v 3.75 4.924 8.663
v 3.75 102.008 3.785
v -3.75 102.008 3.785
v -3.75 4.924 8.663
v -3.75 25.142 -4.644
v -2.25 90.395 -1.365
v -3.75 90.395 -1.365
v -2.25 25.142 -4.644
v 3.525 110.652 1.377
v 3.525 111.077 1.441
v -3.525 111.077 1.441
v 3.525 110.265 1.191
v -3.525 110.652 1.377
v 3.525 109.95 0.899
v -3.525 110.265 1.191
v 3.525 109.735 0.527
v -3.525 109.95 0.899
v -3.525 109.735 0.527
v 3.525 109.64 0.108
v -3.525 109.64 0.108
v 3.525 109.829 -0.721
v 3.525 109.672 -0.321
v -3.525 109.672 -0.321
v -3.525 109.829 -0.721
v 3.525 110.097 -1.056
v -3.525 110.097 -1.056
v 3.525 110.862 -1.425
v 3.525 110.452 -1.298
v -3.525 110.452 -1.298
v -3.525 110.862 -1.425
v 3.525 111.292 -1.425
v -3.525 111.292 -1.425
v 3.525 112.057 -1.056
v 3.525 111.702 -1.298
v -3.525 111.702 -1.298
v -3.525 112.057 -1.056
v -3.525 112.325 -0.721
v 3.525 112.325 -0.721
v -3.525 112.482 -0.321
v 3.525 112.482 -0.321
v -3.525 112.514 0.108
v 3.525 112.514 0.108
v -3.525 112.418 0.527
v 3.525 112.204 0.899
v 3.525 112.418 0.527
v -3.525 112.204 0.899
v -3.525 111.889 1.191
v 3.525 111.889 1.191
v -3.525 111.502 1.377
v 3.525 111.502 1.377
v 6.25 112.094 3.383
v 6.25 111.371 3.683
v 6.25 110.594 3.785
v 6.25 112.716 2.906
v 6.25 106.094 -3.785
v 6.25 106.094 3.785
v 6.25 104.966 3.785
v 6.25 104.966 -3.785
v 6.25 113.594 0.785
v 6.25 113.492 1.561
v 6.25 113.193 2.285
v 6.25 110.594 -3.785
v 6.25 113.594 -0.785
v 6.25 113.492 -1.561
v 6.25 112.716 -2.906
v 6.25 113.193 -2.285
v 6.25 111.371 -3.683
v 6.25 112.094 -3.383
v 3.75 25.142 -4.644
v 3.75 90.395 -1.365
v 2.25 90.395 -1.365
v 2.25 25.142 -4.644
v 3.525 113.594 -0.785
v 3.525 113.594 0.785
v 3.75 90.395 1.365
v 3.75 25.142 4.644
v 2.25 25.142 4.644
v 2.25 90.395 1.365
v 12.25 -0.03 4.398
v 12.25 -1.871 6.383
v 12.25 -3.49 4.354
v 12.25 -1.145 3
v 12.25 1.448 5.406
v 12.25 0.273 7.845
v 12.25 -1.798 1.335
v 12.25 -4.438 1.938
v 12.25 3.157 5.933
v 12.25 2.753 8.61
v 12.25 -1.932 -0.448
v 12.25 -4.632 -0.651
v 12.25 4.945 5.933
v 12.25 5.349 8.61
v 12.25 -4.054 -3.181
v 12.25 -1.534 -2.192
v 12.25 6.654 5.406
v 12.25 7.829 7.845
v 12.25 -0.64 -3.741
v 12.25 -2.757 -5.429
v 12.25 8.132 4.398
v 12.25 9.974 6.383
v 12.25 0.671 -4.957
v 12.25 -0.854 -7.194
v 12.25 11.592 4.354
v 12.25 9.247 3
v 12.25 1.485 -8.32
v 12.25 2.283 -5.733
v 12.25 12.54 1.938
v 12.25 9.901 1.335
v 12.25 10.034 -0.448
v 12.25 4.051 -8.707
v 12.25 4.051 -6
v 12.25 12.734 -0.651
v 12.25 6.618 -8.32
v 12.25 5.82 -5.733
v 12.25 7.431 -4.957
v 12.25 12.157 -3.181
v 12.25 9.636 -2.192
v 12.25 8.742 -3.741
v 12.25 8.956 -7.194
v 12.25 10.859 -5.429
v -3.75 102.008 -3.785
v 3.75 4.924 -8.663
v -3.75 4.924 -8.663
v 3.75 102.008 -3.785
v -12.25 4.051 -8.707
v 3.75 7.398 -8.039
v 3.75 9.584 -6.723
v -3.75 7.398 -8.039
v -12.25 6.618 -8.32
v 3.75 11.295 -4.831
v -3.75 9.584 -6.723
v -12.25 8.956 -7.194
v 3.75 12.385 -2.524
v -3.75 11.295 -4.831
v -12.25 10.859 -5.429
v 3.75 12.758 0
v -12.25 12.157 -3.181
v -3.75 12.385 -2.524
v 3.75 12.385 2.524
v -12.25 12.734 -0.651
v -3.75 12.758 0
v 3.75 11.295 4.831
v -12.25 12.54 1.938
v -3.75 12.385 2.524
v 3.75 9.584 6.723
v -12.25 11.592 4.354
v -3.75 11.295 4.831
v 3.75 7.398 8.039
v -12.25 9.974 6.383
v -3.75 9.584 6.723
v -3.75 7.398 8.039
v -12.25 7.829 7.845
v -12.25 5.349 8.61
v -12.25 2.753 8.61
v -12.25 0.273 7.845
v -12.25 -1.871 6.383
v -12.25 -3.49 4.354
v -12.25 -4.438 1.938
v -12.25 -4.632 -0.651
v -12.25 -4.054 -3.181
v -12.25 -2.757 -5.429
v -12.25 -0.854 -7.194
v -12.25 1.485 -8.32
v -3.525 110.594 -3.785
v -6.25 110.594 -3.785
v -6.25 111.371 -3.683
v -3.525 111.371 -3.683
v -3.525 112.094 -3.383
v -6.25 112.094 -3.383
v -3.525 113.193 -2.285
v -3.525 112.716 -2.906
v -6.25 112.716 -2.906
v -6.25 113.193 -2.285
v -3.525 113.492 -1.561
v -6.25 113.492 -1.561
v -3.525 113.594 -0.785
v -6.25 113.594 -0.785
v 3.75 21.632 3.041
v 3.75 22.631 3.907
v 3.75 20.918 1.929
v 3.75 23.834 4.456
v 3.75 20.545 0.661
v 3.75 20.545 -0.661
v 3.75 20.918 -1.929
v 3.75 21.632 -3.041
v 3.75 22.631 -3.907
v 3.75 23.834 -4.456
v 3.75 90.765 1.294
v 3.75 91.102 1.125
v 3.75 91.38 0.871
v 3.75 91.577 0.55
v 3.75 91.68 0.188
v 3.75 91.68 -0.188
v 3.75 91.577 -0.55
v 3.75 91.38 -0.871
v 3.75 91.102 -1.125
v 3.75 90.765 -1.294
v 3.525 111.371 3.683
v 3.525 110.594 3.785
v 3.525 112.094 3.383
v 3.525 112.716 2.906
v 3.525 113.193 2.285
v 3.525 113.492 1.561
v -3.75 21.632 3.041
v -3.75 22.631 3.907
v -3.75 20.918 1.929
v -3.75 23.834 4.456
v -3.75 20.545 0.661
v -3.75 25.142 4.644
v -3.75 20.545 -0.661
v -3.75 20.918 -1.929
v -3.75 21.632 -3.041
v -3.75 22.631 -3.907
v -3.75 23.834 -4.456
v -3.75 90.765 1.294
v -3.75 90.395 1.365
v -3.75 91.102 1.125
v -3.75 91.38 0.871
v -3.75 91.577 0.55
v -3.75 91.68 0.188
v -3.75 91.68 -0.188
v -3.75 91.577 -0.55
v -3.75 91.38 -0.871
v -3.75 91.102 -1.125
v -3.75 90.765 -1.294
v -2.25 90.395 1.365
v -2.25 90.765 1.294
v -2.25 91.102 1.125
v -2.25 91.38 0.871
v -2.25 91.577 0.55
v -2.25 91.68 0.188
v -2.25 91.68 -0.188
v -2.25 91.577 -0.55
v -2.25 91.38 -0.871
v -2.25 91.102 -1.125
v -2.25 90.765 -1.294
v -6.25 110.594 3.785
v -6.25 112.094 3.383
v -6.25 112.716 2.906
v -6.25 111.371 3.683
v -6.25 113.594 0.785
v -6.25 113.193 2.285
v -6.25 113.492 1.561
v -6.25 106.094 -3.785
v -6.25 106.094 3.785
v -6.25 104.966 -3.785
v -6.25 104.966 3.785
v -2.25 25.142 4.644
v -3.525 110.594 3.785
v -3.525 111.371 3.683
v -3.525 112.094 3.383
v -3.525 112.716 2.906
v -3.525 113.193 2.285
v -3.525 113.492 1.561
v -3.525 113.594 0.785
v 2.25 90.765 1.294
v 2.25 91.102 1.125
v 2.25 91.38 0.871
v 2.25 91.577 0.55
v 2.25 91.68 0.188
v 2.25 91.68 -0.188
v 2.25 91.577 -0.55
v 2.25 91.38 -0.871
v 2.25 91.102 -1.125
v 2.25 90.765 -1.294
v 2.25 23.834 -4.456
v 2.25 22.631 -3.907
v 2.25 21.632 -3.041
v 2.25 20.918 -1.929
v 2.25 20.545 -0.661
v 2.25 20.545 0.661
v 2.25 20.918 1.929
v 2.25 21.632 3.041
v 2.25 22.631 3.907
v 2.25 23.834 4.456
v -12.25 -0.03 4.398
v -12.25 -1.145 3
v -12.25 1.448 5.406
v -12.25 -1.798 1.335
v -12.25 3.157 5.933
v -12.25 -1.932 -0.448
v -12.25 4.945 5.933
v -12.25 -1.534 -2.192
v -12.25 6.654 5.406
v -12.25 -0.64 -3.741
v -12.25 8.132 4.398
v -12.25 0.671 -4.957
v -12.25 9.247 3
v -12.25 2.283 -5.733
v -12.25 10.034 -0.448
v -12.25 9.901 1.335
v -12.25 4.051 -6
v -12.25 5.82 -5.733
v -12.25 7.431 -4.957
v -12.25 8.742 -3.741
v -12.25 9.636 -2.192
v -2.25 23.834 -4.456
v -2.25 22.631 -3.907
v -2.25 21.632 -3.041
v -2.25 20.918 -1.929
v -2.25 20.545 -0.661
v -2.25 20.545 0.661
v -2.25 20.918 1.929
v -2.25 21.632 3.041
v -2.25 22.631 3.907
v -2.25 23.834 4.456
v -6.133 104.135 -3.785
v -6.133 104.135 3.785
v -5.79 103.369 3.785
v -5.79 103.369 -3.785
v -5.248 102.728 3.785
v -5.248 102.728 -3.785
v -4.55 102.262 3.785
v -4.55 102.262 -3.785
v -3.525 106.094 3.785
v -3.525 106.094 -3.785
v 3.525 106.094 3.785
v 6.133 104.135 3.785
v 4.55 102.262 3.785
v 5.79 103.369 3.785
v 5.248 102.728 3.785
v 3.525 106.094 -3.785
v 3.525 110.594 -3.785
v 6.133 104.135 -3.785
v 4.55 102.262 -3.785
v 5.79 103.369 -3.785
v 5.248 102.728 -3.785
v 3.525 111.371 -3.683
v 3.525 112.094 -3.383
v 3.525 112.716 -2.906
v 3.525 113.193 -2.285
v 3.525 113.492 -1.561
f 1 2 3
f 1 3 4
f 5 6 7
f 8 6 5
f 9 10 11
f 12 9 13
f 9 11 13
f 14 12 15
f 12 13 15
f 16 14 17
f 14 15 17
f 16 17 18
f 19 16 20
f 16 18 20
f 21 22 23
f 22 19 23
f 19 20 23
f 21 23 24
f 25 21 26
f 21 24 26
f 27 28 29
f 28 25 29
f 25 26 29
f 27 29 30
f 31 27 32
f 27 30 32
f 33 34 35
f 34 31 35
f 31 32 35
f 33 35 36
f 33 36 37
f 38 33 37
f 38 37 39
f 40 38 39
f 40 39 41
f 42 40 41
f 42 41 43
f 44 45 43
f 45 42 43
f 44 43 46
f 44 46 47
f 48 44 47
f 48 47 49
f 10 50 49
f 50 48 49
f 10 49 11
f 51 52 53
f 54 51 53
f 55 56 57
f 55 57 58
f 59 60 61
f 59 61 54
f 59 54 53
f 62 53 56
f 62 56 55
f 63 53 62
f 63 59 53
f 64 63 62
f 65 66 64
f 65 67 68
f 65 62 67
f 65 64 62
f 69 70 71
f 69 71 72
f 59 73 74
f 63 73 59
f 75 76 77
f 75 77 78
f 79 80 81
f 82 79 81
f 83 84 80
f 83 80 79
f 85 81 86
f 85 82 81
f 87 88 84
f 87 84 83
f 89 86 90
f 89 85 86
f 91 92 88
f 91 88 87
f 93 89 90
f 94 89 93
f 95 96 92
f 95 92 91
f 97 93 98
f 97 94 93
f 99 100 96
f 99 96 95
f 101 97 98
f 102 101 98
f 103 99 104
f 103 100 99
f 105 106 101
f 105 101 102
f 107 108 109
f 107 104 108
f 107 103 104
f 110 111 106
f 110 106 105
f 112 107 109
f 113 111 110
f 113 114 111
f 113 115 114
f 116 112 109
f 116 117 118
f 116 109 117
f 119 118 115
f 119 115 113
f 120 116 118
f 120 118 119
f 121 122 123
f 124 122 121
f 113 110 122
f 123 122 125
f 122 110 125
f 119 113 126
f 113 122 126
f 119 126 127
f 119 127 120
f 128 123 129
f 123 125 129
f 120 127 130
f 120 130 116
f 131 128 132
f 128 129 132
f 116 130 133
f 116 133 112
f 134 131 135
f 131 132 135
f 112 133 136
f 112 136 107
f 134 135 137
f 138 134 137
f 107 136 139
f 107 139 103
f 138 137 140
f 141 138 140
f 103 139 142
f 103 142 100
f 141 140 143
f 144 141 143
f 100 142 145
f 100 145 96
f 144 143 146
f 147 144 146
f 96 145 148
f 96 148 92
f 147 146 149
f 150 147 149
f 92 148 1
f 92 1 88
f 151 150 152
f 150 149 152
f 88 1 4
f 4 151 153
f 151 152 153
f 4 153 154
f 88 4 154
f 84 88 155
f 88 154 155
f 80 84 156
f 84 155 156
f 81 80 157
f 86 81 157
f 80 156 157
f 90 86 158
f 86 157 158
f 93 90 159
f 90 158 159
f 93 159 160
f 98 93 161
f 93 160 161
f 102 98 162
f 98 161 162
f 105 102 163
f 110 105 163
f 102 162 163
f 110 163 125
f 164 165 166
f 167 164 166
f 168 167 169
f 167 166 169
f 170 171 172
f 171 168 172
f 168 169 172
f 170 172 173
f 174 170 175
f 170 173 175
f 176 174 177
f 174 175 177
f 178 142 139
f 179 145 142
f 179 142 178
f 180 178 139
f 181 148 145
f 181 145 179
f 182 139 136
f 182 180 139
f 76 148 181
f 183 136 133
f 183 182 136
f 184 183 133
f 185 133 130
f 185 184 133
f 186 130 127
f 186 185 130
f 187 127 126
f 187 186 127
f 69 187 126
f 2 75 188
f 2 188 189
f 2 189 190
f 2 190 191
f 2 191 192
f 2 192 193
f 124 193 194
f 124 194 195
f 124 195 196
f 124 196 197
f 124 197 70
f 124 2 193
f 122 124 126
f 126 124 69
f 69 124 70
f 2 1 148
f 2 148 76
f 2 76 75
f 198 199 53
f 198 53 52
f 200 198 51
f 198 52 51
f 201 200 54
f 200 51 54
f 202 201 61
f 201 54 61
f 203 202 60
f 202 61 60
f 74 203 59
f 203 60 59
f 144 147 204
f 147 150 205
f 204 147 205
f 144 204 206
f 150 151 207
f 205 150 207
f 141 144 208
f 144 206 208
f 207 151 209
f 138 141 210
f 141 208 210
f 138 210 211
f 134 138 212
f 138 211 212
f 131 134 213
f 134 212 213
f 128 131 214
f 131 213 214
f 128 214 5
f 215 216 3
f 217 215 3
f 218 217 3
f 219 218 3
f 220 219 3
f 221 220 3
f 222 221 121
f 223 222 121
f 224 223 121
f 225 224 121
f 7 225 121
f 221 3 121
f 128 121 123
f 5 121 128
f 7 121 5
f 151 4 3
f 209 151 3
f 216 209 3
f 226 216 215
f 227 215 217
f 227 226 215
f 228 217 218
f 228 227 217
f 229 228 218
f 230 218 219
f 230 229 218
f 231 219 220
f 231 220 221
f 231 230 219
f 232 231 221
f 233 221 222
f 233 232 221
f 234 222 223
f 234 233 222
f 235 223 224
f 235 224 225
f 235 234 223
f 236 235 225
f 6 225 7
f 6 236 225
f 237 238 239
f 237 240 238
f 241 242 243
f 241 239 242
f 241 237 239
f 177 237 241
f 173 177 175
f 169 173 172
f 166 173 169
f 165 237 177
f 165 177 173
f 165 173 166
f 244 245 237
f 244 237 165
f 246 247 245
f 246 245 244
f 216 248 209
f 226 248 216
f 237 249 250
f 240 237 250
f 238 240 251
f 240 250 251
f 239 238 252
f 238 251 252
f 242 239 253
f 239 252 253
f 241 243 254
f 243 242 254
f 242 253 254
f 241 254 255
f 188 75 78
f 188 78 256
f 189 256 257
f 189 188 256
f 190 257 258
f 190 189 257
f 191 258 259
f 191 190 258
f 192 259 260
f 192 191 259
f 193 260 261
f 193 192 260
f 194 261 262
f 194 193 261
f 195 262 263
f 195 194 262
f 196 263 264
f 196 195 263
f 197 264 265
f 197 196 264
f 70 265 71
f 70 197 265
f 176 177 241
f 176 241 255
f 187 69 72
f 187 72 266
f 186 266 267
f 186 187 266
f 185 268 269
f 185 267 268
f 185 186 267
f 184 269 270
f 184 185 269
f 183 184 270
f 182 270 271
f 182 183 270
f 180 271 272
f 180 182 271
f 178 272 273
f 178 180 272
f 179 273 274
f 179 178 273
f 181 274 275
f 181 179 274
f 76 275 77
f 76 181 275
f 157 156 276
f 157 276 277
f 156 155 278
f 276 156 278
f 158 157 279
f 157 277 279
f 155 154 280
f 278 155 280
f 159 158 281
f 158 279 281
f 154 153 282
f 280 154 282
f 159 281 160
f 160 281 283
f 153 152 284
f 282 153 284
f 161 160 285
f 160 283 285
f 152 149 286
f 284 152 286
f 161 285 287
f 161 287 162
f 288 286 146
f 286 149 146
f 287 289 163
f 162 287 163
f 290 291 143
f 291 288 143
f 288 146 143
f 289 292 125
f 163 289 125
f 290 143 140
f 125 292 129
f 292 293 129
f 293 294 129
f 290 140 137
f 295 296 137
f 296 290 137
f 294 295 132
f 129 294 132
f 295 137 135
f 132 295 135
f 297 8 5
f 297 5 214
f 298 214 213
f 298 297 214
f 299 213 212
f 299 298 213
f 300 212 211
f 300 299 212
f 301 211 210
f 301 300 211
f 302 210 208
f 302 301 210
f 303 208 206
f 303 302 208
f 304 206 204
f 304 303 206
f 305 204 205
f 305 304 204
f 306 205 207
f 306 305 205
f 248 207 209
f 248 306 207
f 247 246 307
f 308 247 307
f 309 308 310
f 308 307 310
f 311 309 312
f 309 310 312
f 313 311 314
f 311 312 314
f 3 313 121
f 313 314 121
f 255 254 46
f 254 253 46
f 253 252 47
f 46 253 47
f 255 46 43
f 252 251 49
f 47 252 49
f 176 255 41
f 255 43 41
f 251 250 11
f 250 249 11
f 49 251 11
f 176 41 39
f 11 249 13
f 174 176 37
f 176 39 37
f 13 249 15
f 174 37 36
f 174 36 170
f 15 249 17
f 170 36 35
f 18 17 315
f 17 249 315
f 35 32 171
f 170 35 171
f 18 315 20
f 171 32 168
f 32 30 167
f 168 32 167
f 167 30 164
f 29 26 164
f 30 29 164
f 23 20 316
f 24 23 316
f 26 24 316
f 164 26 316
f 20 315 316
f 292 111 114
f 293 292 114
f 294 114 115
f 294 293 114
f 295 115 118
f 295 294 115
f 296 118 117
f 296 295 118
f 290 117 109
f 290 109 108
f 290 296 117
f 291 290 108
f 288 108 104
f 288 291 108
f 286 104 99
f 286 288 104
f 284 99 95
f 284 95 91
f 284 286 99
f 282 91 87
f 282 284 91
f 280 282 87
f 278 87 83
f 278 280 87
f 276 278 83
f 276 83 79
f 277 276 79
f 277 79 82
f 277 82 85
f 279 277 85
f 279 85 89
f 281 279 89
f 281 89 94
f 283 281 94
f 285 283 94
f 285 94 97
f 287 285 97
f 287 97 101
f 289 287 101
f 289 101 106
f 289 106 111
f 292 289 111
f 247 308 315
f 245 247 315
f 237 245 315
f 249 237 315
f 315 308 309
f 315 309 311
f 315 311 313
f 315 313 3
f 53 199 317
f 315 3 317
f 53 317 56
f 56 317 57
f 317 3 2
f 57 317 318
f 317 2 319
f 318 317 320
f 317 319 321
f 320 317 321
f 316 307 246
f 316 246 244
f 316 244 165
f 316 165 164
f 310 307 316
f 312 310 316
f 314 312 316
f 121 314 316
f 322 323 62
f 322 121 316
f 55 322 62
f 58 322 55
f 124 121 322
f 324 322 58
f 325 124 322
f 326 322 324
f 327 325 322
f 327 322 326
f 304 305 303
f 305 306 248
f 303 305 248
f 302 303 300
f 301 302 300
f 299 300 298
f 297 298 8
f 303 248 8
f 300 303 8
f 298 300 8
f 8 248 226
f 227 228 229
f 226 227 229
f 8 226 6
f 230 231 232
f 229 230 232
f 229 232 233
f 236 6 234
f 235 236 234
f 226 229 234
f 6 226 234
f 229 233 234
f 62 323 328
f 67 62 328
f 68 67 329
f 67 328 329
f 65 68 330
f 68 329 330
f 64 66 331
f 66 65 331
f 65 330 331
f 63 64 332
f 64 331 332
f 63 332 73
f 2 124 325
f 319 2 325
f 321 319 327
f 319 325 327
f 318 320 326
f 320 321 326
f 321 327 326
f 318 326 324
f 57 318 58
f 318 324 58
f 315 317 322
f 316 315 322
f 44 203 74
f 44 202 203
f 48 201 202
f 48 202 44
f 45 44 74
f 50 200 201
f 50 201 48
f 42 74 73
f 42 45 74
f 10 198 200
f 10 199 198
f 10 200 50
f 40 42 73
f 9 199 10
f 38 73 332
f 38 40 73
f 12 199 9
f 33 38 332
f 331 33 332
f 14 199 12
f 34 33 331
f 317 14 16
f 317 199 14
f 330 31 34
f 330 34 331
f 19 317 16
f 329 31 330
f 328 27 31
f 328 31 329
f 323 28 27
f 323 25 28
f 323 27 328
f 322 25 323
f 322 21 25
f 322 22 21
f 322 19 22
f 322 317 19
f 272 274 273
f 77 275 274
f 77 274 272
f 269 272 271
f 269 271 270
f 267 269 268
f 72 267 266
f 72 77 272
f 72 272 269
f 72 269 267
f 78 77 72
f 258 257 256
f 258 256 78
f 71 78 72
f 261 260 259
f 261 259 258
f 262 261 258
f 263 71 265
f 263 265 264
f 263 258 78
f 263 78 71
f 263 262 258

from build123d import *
from build123d.topology import SkipClean

# Parameters (mm, degrees)
Y_KSEKLIK_EKSTR_ZYON2_DEPTH      = 3.75
Y_KSEKLIK_EKSTR_ZYON3_DEPTH      = 2.25
IZIM4_R                          = 6
KES_EKSTR_ZYON1_DEPTH            = 15.5
Y_KSEKLIK_EKSTR_ZYON5_DEPTH      = 8.5
Y_KSEKLIK_EKSTR_ZYON5_DEPTH_BACK = 16
IZIM5_R                          = 8.707330246
IZIM5_R_2                        = 6
IZIM1_6_W                        = 7.569576012
IZIM1_6_H                        = 4.08664072
Y_KSEKLIK_EKSTR_ZYON6_DEPTH      = 6.25
IZIM6_W                          = 2.724991533
IZIM6_H                          = 7.569576012
Y_KSEKLIK_EKSTR_ZYON7_DEPTH      = 7.5
IZIM7_R                          = 1.441213073
Y_KSEKLIK_EKSTR_ZYON8_DEPTH      = 8.5
RADYUS1_R                        = 3


with BuildPart() as part:
    # Çizim1 → Yükseklik-Ekstrüzyon2 (new, symmetric)
    with BuildSketch(Plane(origin=(0, 0, 0), x_dir=(0, 0, -1), z_dir=(1, 0, 0))):
        with BuildLine():
            Line((3.784788006, 102.00780299), (-3.784788006, 102.00780299))
            Line((-3.784788006, 102.00780299), (-8.707330246, 4.05112335))
            ThreePointArc((-8.707330246, 4.05112335), (0, -4.656206896), (8.707330246, 4.05112335))
            Line((8.707330246, 4.05112335), (3.784788006, 102.00780299))
        make_face()
        with BuildLine():
            Line((-4.643687916, 25.141862002), (-1.364548141, 90.395470555))
            ThreePointArc((-1.364548141, 90.395470555), (0, 91.693168951), (1.364548141, 90.395470555))
            Line((1.364548141, 90.395470555), (4.643687916, 25.141862002))
            ThreePointArc((4.643687916, 25.141862002), (0, 20.498174086), (-4.643687916, 25.141862002))
        make_face(mode=Mode.SUBTRACT)
    extrude(amount=Y_KSEKLIK_EKSTR_ZYON2_DEPTH, both=True)

    # Çizim1<5> → Yükseklik-Ekstrüzyon3 (add, symmetric)
    with BuildSketch(Plane(origin=(0, 0, 0), x_dir=(0, 0, -1), z_dir=(1, 0, 0))):
        with BuildLine():
            Line((-1.364548141, 90.395470555), (-4.643687916, 25.141862002))
            ThreePointArc((-4.643687916, 25.141862002), (0, 20.498174086), (4.643687916, 25.141862002))
            Line((4.643687916, 25.141862002), (1.364548141, 90.395470555))
            ThreePointArc((1.364548141, 90.395470555), (0, 91.693168951), (-1.364548141, 90.395470555))
        make_face()
    extrude(amount=Y_KSEKLIK_EKSTR_ZYON3_DEPTH, both=True)

    # Çizim4 → Kes-Ekstrüzyon1 (cut)
    with BuildSketch(Plane(origin=(3.75, 0, 0), x_dir=(0, 0, -1), z_dir=(1, 0, 0))):
        with Locations((0, 4.05112335)):
            Circle(IZIM4_R)
    extrude(amount=-KES_EKSTR_ZYON1_DEPTH, mode=Mode.SUBTRACT)

    # Çizim5 → Yükseklik-Ekstrüzyon5 (add, two sides: drawn at the far end of the back side and taken through both)
    with SkipClean():  # the faces are left unmerged after this step: merging them gives an invalid solid
        with BuildSketch(Plane(origin=(3.75, 0, 0), x_dir=(0, 0, -1), z_dir=(1, 0, 0)).offset(-Y_KSEKLIK_EKSTR_ZYON5_DEPTH_BACK)):
            with Locations((0, 4.05112335)):
                Circle(IZIM5_R)
            with Locations((0, 4.05112335)):
                Circle(IZIM5_R_2, mode=Mode.SUBTRACT)
        extrude(amount=Y_KSEKLIK_EKSTR_ZYON5_DEPTH + Y_KSEKLIK_EKSTR_ZYON5_DEPTH_BACK)

    # Çizim1<6> → Yükseklik-Ekstrüzyon6 (add, symmetric)
    with BuildSketch(Plane(origin=(0, 0, 0), x_dir=(0, 0, -1), z_dir=(1, 0, 0))):
        with Locations((0, 104.05112335)):
            Rectangle(IZIM1_6_W, IZIM1_6_H)
    extrude(amount=Y_KSEKLIK_EKSTR_ZYON6_DEPTH, both=True)

    # Çizim6 → Yükseklik-Ekstrüzyon7 (add)
    with BuildSketch(Plane(origin=(0, 106.09444371, 0), x_dir=(1, 0, 0), z_dir=(0, 1, 0))):
        with Locations((-4.887504233, 0)):
            Rectangle(IZIM6_W, IZIM6_H)
        with Locations((4.887504233, 0)):
            Rectangle(IZIM6_W, IZIM6_H)
    extrude(amount=Y_KSEKLIK_EKSTR_ZYON7_DEPTH)

    # Çizim7 → Yükseklik-Ekstrüzyon8 (add)
    with BuildSketch(Plane(origin=(-3.525008467, 0, 0), x_dir=(0, 0, -1), z_dir=(1, 0, 0))):
        with Locations(Location((0, 111.076861872, 0), (0, 0, 180))):
            Circle(IZIM7_R)
    extrude(amount=Y_KSEKLIK_EKSTR_ZYON8_DEPTH)

    # Radyus1
    # the kernel refuses this fillet: 3 mm, written as the material it takes off along each edge
    with BuildSketch(Plane(origin=(6.25, 102.00780299, -11.179887735), x_dir=(0, 1, 0), z_dir=(0, 0, 1))) as radyus1_piece_1:
        with BuildLine():
            CenterArc((2.958039892, 3), RADYUS1_R, 189.594068227, 80.405931773)
            Line((0, 2.5), (-0.059160798, 2.49))
            ThreePointArc((-0.059160798, 2.49), (-0.06, 1.25), (-0.06, 0))
            Line((-0.06, 0), (0, -0.06))
            Line((0, -0.06), (2.958039892, -0.06))
            Line((2.958039892, -0.06), (2.958039892, 0))
        make_face()
    extrude(amount=22.359775471, mode=Mode.SUBTRACT)
    with BuildSketch(Plane(origin=(-6.25, 102.00780299, -11.179887735), x_dir=(1, 0, 0), z_dir=(0, 0, 1))) as radyus1_piece_2:
        with BuildLine():
            CenterArc((3, 2.958039892), RADYUS1_R, 180, 80.405931773)
            Line((0, 2.958039892), (-0.06, 2.958039892))
            Line((-0.06, 2.958039892), (-0.06, 0))
            Line((-0.06, 0), (0, -0.06))
            ThreePointArc((0, -0.06), (1.25, -0.06), (2.49, -0.059160798))
            Line((2.49, -0.059160798), (2.5, 0))
        make_face()
    extrude(amount=22.359775471, mode=Mode.SUBTRACT)
    with BuildSketch(Plane(origin=(13.75, 113.59444371, 3.784788006), x_dir=(0, -1, 0), z_dir=(-1, 0, 0)), Plane(origin=(-3.974991533, 113.59444371, -3.784788006), x_dir=(0, -1, 0), z_dir=(1, 0, 0)), Plane(origin=(-13.75, 113.59444371, -3.784788006), x_dir=(0, -1, 0), z_dir=(1, 0, 0)), Plane(origin=(3.974991533, 113.59444371, 3.784788006), x_dir=(0, -1, 0), z_dir=(-1, 0, 0))) as radyus1_piece_3:
        with BuildLine():
            CenterArc((RADYUS1_R, -RADYUS1_R), RADYUS1_R, 90, 90)
            Line((0, -RADYUS1_R), (-RADYUS1_R * 0.02, -RADYUS1_R))
            Line((-RADYUS1_R * 0.02, -RADYUS1_R), (-RADYUS1_R * 0.02, RADYUS1_R * 0.02))
            Line((-RADYUS1_R * 0.02, RADYUS1_R * 0.02), (RADYUS1_R, RADYUS1_R * 0.02))
            Line((RADYUS1_R, RADYUS1_R * 0.02), (RADYUS1_R, 0))
        make_face()
    extrude(amount=17.724991533, mode=Mode.SUBTRACT)


solid = part.part
